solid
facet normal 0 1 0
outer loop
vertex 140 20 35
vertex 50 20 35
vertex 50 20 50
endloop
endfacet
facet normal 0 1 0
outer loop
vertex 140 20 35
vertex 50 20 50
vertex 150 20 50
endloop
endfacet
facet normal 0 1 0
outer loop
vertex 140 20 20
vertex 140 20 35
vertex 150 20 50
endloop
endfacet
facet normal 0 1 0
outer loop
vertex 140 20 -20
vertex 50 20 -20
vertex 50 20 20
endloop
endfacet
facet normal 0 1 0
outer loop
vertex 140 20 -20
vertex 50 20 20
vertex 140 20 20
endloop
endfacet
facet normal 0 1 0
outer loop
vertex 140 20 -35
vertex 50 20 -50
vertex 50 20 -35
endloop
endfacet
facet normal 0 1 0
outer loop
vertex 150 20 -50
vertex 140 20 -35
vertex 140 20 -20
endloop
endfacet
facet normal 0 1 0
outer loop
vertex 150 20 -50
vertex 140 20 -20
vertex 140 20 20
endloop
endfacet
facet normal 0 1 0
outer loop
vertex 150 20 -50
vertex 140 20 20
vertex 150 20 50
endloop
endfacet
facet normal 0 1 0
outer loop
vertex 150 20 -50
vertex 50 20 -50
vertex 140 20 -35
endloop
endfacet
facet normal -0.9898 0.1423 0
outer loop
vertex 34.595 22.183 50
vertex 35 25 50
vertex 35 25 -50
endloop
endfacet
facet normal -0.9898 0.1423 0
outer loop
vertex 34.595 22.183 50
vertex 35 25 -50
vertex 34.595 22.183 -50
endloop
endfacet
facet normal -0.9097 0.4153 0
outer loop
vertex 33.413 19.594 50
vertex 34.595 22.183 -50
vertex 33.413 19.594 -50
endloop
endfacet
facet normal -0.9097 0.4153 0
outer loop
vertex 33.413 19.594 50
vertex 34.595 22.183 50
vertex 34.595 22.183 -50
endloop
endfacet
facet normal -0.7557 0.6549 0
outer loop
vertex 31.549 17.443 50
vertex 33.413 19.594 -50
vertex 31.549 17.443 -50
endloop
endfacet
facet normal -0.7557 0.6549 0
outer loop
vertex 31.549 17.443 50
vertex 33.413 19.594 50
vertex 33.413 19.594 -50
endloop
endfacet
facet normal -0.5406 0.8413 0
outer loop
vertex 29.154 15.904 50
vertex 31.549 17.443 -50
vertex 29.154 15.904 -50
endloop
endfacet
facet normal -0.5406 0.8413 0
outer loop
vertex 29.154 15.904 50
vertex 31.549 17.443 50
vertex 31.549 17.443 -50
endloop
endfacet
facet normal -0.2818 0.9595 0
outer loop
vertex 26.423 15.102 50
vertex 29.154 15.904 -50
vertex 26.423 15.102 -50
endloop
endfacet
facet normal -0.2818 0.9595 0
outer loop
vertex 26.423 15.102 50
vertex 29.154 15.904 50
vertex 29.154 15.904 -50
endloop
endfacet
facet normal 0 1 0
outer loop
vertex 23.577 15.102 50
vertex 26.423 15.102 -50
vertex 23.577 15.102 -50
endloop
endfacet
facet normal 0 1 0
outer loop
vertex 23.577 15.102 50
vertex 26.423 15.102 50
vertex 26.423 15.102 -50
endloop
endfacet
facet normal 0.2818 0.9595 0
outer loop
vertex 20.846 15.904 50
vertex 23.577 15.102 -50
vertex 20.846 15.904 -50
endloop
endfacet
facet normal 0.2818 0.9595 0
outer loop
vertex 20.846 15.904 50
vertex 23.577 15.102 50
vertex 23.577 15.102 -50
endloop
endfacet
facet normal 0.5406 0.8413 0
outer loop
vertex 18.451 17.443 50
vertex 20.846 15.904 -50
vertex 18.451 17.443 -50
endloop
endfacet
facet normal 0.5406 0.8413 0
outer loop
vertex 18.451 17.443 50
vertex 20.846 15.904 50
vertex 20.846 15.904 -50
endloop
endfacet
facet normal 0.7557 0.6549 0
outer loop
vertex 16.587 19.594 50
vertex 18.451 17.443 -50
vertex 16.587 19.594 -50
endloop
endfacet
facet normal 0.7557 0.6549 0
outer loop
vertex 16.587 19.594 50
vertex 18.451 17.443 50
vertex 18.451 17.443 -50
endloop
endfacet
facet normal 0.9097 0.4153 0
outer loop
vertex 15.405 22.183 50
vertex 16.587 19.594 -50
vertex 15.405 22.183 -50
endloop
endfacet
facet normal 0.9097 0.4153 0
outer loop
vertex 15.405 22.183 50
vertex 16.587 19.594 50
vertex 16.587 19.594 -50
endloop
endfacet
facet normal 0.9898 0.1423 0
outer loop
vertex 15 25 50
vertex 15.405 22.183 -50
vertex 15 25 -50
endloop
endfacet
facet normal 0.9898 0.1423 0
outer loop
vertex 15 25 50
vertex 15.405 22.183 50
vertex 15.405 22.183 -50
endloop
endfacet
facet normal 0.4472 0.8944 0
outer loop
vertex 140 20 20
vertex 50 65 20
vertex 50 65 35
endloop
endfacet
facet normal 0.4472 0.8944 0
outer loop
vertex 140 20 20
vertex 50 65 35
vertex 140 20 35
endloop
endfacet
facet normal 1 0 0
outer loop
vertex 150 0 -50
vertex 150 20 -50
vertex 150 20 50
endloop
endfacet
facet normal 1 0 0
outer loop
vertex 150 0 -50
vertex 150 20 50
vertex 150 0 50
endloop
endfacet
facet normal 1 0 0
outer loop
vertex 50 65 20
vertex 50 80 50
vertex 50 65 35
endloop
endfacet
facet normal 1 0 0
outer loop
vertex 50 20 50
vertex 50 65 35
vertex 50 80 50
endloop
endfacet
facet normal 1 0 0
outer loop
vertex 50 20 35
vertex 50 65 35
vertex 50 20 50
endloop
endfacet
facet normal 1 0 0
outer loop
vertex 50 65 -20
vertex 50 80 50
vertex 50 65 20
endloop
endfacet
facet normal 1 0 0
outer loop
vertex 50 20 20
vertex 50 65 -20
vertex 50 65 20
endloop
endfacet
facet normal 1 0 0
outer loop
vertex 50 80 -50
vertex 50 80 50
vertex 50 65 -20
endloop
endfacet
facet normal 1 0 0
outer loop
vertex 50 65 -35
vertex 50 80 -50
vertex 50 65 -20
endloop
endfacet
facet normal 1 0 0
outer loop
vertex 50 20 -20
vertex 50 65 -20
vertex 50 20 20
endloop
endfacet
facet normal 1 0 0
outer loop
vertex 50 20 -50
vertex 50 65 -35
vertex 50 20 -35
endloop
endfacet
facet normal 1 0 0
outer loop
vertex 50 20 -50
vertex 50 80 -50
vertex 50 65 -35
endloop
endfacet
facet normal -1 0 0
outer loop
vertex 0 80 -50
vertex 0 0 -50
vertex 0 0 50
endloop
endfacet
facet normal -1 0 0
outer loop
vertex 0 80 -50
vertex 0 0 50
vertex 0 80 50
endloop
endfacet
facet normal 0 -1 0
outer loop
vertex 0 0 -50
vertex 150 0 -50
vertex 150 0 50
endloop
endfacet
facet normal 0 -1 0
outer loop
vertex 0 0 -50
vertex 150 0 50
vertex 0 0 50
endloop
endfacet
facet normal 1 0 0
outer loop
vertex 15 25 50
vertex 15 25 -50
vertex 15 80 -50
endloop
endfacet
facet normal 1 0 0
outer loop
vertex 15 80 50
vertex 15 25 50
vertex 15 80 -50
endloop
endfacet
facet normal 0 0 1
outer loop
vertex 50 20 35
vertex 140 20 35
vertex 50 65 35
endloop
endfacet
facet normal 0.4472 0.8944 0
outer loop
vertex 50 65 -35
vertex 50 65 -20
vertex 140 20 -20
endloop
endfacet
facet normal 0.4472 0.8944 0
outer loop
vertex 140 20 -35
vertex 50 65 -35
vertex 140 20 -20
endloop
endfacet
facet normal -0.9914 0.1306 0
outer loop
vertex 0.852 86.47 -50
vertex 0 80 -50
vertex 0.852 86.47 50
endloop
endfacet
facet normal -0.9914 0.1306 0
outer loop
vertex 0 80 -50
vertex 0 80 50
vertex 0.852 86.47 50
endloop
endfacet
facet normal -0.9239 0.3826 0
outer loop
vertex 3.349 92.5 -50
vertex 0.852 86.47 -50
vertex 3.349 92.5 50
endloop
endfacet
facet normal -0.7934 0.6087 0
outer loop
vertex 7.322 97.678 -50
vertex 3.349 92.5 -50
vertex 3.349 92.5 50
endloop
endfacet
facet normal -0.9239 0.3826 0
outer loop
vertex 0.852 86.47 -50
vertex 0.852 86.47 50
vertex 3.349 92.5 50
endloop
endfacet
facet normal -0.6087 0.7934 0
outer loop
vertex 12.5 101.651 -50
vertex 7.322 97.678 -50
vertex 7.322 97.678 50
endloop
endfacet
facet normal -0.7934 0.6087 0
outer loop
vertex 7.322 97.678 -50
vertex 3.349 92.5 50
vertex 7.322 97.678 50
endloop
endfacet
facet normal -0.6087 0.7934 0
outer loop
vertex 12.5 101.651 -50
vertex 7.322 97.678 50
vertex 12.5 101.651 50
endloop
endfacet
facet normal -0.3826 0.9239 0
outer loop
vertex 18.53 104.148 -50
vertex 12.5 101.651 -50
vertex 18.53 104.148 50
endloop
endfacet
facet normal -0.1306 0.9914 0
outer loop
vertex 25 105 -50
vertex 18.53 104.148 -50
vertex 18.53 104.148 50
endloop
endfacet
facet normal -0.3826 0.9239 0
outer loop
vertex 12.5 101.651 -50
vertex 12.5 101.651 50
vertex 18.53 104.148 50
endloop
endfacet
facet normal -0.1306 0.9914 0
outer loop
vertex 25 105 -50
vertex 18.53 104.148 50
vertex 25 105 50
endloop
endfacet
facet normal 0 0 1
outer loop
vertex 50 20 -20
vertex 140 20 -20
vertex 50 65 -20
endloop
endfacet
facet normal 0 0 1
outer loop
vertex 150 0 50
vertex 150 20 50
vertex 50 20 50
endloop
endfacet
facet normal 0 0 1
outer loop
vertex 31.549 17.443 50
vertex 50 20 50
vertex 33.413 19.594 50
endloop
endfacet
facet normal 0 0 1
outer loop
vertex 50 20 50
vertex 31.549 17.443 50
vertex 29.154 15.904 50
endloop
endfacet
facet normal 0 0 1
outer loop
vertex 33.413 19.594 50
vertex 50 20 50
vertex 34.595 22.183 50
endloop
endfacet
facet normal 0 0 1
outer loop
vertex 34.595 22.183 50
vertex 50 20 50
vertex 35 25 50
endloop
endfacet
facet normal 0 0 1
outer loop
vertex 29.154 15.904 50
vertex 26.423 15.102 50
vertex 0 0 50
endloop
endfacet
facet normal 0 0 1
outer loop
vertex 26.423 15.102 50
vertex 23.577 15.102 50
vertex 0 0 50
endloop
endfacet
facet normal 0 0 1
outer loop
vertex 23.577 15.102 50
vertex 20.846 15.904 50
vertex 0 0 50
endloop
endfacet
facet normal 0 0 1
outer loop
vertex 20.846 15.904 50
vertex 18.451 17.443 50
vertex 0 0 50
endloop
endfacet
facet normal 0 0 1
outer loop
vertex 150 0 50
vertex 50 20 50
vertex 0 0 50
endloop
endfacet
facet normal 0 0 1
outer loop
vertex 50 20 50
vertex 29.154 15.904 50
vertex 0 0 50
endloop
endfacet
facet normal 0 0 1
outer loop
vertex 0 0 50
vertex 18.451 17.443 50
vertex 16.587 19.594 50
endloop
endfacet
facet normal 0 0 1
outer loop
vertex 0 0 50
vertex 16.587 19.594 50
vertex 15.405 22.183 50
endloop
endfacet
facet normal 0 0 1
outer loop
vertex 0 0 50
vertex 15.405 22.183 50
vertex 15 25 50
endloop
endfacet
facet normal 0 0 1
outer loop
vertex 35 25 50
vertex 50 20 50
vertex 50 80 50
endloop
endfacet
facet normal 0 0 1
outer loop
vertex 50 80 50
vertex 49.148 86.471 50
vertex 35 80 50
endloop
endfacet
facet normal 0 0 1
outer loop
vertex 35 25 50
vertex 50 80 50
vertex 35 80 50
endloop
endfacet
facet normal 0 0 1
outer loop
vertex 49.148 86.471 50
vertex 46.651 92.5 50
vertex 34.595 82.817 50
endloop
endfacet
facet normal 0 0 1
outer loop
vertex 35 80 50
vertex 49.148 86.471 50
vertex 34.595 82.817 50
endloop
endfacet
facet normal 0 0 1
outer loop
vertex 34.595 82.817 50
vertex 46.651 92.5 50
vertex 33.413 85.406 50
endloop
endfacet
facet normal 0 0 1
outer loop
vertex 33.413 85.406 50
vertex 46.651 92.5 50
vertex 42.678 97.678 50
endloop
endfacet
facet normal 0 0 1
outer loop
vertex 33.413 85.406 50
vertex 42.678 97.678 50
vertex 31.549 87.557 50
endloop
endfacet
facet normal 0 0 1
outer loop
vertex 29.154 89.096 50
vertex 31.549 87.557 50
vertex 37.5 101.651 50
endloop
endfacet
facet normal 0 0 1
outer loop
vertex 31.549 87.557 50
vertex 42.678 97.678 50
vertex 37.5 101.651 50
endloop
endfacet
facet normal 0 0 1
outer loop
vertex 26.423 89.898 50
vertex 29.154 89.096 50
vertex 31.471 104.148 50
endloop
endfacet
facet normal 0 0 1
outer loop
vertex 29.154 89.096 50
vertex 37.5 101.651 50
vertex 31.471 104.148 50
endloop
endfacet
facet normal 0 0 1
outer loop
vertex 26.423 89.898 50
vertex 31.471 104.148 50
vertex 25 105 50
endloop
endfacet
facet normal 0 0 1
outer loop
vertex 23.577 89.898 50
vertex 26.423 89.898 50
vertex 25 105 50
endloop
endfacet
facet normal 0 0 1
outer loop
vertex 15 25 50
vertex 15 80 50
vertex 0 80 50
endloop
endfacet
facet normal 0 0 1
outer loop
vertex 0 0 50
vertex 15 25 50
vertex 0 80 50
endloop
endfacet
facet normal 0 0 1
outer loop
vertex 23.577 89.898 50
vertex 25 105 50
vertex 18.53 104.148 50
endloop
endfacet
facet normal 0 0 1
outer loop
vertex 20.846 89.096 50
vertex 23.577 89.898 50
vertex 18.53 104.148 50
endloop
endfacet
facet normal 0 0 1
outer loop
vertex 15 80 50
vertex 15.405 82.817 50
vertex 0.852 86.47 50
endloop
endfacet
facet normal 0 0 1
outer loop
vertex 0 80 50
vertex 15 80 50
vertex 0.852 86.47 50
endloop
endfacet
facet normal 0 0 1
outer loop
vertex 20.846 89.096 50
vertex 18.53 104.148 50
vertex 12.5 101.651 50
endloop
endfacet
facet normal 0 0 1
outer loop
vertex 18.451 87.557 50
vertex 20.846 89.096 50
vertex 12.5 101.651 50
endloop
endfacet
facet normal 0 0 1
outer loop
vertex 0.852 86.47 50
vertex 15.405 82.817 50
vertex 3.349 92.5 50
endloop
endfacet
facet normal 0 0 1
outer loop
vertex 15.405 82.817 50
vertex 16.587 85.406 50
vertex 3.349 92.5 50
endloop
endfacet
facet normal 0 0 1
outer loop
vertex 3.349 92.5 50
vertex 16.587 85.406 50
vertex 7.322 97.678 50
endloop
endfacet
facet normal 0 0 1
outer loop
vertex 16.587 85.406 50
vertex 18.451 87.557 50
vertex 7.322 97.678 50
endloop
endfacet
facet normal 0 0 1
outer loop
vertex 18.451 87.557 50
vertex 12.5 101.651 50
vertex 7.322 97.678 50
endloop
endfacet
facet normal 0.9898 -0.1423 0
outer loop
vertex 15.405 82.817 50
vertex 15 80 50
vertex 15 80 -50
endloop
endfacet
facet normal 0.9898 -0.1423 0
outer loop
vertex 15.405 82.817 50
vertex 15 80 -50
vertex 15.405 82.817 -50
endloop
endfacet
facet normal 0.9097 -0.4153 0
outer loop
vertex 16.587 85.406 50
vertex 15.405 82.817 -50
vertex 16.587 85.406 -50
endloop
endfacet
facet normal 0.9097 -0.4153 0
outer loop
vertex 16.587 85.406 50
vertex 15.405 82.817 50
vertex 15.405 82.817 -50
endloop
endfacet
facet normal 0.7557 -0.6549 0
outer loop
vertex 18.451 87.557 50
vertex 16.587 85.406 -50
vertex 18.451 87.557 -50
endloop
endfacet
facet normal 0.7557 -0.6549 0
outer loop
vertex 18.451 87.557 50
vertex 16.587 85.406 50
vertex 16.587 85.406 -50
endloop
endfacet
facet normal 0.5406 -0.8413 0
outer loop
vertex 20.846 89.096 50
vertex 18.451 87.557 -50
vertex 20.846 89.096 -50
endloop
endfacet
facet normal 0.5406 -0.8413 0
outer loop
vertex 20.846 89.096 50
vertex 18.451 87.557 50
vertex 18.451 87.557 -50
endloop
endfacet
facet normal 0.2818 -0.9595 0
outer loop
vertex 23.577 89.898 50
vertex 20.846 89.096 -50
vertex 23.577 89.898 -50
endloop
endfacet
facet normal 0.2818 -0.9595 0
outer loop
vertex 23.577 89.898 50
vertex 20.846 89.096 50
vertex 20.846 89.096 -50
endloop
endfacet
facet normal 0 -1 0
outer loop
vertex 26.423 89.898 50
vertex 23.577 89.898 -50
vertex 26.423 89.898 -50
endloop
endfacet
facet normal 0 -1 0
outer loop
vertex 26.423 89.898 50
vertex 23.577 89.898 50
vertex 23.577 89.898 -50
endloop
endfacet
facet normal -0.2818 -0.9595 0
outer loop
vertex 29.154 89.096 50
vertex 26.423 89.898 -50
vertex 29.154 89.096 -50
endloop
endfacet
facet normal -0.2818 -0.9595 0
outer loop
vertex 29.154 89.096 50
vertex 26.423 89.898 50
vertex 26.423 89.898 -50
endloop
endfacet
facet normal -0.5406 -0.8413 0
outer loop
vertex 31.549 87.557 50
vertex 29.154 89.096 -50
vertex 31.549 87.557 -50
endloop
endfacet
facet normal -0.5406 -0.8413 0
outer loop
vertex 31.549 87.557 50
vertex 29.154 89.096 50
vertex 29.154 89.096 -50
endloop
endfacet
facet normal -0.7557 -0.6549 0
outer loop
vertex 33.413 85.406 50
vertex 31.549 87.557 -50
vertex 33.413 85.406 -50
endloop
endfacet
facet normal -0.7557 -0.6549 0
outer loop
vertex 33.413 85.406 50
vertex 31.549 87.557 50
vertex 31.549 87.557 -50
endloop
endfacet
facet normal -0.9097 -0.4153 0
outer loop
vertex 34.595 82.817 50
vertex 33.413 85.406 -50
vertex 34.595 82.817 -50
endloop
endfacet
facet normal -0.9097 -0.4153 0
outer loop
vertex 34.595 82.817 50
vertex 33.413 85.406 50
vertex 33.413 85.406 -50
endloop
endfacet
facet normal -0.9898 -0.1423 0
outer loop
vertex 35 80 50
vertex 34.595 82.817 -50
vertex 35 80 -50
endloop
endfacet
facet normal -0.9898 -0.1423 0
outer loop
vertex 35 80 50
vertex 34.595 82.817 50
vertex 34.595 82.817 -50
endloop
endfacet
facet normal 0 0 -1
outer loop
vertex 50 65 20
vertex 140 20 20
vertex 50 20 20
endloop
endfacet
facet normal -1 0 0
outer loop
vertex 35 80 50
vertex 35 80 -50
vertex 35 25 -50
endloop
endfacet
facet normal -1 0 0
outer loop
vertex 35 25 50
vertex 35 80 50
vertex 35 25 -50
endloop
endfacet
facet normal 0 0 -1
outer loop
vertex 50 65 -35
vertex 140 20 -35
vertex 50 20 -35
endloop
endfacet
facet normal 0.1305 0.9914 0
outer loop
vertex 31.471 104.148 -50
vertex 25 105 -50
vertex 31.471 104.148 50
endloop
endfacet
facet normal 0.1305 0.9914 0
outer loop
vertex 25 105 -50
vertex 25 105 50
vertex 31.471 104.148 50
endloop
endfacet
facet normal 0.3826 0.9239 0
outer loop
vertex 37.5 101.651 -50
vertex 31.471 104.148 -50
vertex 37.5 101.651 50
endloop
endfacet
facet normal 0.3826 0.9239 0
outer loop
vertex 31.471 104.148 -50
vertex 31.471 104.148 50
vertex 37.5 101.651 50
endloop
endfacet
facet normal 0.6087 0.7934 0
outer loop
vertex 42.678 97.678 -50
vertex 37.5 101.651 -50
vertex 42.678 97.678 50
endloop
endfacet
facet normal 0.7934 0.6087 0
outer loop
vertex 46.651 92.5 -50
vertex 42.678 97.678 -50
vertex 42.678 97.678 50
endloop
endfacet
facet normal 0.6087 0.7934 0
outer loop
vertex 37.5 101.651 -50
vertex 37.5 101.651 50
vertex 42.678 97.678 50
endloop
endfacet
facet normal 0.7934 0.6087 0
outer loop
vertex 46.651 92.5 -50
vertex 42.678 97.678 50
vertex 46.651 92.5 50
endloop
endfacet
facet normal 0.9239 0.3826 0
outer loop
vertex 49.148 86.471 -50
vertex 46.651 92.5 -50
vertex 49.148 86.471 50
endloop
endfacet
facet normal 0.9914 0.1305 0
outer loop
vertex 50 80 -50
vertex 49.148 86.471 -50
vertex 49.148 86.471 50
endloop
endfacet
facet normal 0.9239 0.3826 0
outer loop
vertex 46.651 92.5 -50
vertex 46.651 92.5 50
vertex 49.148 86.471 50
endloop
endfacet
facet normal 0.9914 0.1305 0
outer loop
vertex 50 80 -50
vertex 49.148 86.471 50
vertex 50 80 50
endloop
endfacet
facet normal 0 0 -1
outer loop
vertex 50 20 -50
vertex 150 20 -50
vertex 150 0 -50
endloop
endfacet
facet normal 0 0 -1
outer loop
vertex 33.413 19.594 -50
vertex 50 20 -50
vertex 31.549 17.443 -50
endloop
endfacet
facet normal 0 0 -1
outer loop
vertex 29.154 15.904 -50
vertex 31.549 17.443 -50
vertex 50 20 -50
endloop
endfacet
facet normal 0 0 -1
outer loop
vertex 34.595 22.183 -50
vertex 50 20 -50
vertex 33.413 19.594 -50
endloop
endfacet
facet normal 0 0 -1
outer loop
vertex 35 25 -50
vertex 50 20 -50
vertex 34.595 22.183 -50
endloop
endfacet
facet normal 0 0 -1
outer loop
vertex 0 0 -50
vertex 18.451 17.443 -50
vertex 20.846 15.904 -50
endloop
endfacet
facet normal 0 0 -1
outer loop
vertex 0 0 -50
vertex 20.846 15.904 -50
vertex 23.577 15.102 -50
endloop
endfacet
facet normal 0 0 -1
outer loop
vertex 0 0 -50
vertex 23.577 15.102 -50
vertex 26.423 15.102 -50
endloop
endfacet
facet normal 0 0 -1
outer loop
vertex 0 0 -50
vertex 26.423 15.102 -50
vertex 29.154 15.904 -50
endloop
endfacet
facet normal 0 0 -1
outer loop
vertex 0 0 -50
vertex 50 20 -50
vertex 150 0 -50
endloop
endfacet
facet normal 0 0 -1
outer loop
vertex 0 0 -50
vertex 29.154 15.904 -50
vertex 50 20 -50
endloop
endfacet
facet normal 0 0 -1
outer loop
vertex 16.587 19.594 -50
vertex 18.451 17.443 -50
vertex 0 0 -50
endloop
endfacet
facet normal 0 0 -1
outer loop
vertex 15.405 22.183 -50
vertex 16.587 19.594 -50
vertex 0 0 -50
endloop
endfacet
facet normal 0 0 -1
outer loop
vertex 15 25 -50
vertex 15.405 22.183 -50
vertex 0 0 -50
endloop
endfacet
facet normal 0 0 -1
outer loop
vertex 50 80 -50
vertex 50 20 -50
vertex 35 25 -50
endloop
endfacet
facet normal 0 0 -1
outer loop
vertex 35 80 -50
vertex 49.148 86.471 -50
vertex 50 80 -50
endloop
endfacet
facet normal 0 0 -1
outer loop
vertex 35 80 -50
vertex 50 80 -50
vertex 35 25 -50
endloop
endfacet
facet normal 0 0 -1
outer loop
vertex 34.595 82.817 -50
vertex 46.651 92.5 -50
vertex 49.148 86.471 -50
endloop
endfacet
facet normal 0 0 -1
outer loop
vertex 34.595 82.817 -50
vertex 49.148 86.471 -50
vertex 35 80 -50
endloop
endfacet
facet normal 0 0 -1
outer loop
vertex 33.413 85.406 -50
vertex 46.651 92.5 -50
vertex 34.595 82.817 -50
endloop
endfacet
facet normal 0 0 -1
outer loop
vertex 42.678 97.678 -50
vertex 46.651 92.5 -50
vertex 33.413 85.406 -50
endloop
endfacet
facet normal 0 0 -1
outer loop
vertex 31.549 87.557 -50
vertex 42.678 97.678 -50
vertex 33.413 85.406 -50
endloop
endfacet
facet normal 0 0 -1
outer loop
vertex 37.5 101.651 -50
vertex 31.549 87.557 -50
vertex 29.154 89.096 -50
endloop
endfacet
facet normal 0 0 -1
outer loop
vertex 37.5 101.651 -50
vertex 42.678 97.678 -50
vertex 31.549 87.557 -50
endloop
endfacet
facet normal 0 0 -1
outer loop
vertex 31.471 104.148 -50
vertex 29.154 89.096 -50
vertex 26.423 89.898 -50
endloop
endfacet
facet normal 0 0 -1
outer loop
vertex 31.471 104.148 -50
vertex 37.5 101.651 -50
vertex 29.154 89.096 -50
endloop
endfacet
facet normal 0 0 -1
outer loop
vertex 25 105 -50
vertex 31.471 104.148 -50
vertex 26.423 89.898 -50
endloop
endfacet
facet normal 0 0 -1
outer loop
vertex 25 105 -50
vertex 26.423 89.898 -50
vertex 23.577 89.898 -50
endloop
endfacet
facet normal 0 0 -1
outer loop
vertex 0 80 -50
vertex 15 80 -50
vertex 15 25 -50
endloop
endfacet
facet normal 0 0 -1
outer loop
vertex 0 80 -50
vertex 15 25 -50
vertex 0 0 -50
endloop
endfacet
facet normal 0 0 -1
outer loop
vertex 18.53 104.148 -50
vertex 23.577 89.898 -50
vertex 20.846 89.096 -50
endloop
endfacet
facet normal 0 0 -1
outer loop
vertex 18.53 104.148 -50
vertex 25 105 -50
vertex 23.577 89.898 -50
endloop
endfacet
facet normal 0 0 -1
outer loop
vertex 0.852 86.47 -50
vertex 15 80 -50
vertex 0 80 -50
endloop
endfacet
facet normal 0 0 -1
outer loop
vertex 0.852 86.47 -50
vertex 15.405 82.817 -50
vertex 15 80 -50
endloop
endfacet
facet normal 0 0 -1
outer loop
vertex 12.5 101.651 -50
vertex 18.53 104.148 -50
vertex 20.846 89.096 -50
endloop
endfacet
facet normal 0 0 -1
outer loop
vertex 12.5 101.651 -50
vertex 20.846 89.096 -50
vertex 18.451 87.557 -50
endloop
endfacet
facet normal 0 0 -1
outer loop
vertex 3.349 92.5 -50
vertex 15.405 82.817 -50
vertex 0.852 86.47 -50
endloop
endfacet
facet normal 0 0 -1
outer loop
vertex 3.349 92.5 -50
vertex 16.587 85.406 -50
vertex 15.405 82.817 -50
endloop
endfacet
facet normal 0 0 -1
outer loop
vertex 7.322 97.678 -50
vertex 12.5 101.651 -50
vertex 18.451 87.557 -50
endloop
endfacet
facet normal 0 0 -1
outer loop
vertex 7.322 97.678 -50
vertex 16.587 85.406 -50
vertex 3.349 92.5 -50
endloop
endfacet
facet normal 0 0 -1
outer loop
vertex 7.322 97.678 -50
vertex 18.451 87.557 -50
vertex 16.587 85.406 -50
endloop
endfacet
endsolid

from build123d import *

# Parameters (mm, degrees)
BOSS_EXTRUDE1_DEPTH      = 50
BOSS_EXTRUDE1_DEPTH_BACK = 50
FILLET5_R                = 25
FILLET4_R                = 25
CUT_EXTRUDE1_DEPTH       = 209.62646045
BOSS_EXTRUDE2_START      = 20
BOSS_EXTRUDE2_DEPTH      = 15
BOSS_EXTRUDE3_START      = 40
BOSS_EXTRUDE3_DEPTH      = 15


with BuildPart() as part:
    # Sketch1 → Boss-Extrude1 (new, two sides: drawn at the far end of the back side and taken through both)
    with BuildSketch(Plane.XY.offset(-BOSS_EXTRUDE1_DEPTH_BACK)):
        Polygon((0, 0), (0, 105), (50, 105), (50, 20), (150, 20), (150, 0), align=None)
    extrude(amount=BOSS_EXTRUDE1_DEPTH + BOSS_EXTRUDE1_DEPTH_BACK)

    # Fillet5
    fillet5_edges = [part.edges().sort_by_distance(p)[0] for p in [
        (0, 105, 0),
    ]]
    fillet(fillet5_edges, radius=FILLET5_R)

    # Fillet4
    fillet4_edges = [part.edges().sort_by_distance(p)[0] for p in [
        (50, 105, 0),
    ]]
    fillet(fillet4_edges, radius=FILLET4_R - 0.0001)  # a hair under: the kernel refuses the full size

    # Sketch3 → Cut-Extrude1 (cut, through all)
    with BuildSketch(Plane.XY.offset(50)):
        with BuildLine():
            Line((35, 80), (35, 25))
            ThreePointArc((35, 25), (25, 15), (15, 25))
            Line((15, 25), (15, 80))
            ThreePointArc((15, 80), (25, 90), (35, 80))
        make_face()
    extrude(amount=-CUT_EXTRUDE1_DEPTH, mode=Mode.SUBTRACT)

    # Sketch5 → Boss-Extrude2 (add)
    with BuildSketch(Plane.XY.offset(BOSS_EXTRUDE2_START)):
        Polygon((50, 65), (140, 20), (50, 20), align=None)
    extrude(amount=BOSS_EXTRUDE2_DEPTH)

    # Sketch9 → Boss-Extrude3 (add)
    with BuildSketch(Plane(origin=(0, 0, 20), x_dir=(-1, 0, 0), z_dir=(0, 0, -1)).offset(BOSS_EXTRUDE3_START)):
        Polygon((-50, 20), (-50, 65), (-140, 20), align=None)
    extrude(amount=BOSS_EXTRUDE3_DEPTH)


solid = part.part
